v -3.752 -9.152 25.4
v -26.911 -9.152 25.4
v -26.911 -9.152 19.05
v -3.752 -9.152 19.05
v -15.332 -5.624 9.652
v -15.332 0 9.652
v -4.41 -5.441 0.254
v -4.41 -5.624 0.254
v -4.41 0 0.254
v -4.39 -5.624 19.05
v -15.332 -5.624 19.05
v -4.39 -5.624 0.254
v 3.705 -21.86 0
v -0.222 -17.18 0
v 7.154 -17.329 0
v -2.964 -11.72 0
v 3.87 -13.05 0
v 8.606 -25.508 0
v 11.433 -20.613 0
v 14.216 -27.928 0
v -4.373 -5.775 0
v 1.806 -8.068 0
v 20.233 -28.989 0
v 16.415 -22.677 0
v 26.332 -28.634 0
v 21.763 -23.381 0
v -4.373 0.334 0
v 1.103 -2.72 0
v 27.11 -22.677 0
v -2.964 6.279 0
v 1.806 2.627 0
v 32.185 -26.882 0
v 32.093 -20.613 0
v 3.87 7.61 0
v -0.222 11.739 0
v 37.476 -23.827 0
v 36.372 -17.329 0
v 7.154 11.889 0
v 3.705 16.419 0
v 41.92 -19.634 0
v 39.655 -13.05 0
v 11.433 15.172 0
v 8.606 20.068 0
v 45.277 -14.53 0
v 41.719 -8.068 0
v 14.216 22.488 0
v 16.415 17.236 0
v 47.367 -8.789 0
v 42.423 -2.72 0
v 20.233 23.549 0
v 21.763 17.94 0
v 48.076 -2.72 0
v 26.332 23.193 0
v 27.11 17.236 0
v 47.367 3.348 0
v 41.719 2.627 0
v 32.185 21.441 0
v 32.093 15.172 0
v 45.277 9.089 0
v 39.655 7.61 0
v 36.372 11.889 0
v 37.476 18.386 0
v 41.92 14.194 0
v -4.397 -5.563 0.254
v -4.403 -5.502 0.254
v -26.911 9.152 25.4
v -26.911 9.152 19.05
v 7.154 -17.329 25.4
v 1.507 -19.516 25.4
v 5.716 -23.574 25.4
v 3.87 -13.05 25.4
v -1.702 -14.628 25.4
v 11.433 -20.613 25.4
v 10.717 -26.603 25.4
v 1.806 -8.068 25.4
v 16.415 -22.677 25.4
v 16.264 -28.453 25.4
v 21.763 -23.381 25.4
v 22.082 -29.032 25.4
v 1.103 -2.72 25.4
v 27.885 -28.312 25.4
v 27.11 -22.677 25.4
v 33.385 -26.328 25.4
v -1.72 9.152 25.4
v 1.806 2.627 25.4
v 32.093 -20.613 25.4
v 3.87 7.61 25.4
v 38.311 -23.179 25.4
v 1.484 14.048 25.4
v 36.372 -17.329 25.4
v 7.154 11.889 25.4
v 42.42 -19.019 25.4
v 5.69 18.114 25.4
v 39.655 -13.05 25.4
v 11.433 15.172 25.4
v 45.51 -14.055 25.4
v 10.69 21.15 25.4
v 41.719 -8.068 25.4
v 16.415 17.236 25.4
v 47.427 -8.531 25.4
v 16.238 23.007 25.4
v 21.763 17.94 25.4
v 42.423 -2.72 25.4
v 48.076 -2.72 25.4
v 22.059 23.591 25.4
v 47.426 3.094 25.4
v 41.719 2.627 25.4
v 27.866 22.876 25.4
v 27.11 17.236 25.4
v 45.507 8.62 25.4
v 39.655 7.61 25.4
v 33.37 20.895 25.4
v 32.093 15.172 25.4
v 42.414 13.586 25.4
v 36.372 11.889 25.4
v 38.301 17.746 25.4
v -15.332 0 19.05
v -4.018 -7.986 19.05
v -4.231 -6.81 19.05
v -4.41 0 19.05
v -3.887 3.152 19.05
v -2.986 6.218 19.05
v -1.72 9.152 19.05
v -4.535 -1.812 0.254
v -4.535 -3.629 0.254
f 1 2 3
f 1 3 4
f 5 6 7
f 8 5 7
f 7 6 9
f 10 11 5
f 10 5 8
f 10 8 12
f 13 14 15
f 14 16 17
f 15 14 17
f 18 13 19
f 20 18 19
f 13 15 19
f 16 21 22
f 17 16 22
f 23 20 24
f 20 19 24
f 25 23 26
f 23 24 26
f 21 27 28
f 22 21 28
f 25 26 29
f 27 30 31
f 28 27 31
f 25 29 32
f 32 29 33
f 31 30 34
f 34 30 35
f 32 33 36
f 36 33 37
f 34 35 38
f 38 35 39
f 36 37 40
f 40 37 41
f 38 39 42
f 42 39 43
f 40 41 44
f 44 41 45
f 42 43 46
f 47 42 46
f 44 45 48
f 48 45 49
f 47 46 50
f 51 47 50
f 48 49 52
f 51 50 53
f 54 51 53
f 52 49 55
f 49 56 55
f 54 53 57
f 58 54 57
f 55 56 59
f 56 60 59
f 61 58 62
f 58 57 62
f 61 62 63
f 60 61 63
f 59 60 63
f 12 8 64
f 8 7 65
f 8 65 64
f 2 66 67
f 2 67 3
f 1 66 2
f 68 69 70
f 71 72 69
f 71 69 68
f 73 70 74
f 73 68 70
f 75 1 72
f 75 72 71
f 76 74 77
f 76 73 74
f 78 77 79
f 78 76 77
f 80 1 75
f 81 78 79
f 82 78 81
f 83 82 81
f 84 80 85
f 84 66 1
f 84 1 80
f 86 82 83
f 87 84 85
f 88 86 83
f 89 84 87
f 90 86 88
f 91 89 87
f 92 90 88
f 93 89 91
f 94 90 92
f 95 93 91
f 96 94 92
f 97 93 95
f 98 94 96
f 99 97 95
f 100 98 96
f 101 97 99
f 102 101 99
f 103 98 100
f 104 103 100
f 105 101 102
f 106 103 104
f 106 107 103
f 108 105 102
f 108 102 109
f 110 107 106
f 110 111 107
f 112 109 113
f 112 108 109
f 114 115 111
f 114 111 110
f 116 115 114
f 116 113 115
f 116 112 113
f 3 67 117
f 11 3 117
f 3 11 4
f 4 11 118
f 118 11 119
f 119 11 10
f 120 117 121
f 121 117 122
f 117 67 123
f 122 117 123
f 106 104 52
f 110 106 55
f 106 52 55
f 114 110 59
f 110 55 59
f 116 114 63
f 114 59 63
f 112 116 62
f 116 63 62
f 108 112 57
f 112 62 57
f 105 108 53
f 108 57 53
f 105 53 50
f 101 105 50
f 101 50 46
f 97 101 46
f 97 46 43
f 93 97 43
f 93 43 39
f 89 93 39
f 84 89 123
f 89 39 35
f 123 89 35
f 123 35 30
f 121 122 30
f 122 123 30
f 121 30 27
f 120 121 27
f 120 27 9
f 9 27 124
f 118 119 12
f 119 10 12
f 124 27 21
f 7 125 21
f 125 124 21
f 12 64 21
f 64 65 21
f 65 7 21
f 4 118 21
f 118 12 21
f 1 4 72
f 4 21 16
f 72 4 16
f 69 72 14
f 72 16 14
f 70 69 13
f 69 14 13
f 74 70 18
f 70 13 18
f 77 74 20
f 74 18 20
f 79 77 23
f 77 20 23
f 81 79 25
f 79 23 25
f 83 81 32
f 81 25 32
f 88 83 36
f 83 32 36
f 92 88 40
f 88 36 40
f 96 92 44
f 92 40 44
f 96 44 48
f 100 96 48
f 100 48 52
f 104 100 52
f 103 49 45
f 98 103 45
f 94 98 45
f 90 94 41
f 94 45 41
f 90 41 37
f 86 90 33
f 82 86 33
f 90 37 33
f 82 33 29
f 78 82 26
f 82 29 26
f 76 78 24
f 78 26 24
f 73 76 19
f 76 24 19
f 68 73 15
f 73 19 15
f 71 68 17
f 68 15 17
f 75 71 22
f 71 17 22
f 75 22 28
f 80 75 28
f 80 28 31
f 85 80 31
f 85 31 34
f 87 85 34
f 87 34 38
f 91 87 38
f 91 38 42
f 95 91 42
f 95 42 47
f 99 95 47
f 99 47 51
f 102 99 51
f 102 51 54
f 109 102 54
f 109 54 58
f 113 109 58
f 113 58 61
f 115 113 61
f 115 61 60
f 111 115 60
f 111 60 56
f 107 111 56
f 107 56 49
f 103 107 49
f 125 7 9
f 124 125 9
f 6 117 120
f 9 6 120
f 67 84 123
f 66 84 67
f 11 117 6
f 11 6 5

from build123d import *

# Parameters (mm, degrees)
F0_R     = 26.313439
F1_DEPTH = 25.4
F3_R     = 20.660218
F4_DEPTH = 25.401
F5_DEPTH = 6.35
F6_W     = 10.94192
F6_H     = 5.624315
F7_DEPTH = 18.796
F9_DEPTH = 29.034779


with BuildPart() as f1:
    # F0 (on Top) → F1 (new body)
    with BuildSketch(Plane.XY):
        with Locations((21.762719, -2.72034)):
            Circle(F0_R)
    extrude(amount=F1_DEPTH)

    # F3 (on face) → F4 (cut, through all)
    with BuildSketch(Plane(origin=(0, 0, 0), x_dir=(1, 0, 0), z_dir=(0, 0, -1))):
        with Locations((21.762719, 2.72034)):
            Circle(F3_R)
    extrude(amount=-F4_DEPTH, mode=Mode.SUBTRACT)

    # F2 (on face) → F5 (join)
    with BuildSketch(Plane.XY.offset(25.4)):
        with BuildLine():
            ThreePointArc((-3.75248, -9.15242), (-4.389986, 0.183635), (-1.719926, 9.15242))
            Line((-1.719926, 9.15242), (-26.911331, 9.15242))
            Line((-26.911331, 9.15242), (-26.911331, -9.15242))
            Line((-26.911331, -9.15242), (-3.75248, -9.15242))
        make_face()
    extrude(amount=-F5_DEPTH)

    # F6 (on face) → F7 (join)
    with BuildSketch(Plane(origin=(0, 0, 19.05), x_dir=(1, 0, 0), z_dir=(0, 0, -1))):
        with Locations((-9.860946, 2.812158)):
            Rectangle(F6_W, F6_H)
    extrude(amount=F7_DEPTH)

    # F8 (on face) → F9 (cut, through all)
    with BuildSketch(Plane(origin=(0, 0, 0), x_dir=(-1, 0, 0), z_dir=(0, 1, 0))):
        Polygon((15.331906, 0.254), (15.331906, 9.652), (4.409725, 0.254), align=None)
    extrude(amount=-F9_DEPTH, mode=Mode.SUBTRACT)


solid = f1.part
